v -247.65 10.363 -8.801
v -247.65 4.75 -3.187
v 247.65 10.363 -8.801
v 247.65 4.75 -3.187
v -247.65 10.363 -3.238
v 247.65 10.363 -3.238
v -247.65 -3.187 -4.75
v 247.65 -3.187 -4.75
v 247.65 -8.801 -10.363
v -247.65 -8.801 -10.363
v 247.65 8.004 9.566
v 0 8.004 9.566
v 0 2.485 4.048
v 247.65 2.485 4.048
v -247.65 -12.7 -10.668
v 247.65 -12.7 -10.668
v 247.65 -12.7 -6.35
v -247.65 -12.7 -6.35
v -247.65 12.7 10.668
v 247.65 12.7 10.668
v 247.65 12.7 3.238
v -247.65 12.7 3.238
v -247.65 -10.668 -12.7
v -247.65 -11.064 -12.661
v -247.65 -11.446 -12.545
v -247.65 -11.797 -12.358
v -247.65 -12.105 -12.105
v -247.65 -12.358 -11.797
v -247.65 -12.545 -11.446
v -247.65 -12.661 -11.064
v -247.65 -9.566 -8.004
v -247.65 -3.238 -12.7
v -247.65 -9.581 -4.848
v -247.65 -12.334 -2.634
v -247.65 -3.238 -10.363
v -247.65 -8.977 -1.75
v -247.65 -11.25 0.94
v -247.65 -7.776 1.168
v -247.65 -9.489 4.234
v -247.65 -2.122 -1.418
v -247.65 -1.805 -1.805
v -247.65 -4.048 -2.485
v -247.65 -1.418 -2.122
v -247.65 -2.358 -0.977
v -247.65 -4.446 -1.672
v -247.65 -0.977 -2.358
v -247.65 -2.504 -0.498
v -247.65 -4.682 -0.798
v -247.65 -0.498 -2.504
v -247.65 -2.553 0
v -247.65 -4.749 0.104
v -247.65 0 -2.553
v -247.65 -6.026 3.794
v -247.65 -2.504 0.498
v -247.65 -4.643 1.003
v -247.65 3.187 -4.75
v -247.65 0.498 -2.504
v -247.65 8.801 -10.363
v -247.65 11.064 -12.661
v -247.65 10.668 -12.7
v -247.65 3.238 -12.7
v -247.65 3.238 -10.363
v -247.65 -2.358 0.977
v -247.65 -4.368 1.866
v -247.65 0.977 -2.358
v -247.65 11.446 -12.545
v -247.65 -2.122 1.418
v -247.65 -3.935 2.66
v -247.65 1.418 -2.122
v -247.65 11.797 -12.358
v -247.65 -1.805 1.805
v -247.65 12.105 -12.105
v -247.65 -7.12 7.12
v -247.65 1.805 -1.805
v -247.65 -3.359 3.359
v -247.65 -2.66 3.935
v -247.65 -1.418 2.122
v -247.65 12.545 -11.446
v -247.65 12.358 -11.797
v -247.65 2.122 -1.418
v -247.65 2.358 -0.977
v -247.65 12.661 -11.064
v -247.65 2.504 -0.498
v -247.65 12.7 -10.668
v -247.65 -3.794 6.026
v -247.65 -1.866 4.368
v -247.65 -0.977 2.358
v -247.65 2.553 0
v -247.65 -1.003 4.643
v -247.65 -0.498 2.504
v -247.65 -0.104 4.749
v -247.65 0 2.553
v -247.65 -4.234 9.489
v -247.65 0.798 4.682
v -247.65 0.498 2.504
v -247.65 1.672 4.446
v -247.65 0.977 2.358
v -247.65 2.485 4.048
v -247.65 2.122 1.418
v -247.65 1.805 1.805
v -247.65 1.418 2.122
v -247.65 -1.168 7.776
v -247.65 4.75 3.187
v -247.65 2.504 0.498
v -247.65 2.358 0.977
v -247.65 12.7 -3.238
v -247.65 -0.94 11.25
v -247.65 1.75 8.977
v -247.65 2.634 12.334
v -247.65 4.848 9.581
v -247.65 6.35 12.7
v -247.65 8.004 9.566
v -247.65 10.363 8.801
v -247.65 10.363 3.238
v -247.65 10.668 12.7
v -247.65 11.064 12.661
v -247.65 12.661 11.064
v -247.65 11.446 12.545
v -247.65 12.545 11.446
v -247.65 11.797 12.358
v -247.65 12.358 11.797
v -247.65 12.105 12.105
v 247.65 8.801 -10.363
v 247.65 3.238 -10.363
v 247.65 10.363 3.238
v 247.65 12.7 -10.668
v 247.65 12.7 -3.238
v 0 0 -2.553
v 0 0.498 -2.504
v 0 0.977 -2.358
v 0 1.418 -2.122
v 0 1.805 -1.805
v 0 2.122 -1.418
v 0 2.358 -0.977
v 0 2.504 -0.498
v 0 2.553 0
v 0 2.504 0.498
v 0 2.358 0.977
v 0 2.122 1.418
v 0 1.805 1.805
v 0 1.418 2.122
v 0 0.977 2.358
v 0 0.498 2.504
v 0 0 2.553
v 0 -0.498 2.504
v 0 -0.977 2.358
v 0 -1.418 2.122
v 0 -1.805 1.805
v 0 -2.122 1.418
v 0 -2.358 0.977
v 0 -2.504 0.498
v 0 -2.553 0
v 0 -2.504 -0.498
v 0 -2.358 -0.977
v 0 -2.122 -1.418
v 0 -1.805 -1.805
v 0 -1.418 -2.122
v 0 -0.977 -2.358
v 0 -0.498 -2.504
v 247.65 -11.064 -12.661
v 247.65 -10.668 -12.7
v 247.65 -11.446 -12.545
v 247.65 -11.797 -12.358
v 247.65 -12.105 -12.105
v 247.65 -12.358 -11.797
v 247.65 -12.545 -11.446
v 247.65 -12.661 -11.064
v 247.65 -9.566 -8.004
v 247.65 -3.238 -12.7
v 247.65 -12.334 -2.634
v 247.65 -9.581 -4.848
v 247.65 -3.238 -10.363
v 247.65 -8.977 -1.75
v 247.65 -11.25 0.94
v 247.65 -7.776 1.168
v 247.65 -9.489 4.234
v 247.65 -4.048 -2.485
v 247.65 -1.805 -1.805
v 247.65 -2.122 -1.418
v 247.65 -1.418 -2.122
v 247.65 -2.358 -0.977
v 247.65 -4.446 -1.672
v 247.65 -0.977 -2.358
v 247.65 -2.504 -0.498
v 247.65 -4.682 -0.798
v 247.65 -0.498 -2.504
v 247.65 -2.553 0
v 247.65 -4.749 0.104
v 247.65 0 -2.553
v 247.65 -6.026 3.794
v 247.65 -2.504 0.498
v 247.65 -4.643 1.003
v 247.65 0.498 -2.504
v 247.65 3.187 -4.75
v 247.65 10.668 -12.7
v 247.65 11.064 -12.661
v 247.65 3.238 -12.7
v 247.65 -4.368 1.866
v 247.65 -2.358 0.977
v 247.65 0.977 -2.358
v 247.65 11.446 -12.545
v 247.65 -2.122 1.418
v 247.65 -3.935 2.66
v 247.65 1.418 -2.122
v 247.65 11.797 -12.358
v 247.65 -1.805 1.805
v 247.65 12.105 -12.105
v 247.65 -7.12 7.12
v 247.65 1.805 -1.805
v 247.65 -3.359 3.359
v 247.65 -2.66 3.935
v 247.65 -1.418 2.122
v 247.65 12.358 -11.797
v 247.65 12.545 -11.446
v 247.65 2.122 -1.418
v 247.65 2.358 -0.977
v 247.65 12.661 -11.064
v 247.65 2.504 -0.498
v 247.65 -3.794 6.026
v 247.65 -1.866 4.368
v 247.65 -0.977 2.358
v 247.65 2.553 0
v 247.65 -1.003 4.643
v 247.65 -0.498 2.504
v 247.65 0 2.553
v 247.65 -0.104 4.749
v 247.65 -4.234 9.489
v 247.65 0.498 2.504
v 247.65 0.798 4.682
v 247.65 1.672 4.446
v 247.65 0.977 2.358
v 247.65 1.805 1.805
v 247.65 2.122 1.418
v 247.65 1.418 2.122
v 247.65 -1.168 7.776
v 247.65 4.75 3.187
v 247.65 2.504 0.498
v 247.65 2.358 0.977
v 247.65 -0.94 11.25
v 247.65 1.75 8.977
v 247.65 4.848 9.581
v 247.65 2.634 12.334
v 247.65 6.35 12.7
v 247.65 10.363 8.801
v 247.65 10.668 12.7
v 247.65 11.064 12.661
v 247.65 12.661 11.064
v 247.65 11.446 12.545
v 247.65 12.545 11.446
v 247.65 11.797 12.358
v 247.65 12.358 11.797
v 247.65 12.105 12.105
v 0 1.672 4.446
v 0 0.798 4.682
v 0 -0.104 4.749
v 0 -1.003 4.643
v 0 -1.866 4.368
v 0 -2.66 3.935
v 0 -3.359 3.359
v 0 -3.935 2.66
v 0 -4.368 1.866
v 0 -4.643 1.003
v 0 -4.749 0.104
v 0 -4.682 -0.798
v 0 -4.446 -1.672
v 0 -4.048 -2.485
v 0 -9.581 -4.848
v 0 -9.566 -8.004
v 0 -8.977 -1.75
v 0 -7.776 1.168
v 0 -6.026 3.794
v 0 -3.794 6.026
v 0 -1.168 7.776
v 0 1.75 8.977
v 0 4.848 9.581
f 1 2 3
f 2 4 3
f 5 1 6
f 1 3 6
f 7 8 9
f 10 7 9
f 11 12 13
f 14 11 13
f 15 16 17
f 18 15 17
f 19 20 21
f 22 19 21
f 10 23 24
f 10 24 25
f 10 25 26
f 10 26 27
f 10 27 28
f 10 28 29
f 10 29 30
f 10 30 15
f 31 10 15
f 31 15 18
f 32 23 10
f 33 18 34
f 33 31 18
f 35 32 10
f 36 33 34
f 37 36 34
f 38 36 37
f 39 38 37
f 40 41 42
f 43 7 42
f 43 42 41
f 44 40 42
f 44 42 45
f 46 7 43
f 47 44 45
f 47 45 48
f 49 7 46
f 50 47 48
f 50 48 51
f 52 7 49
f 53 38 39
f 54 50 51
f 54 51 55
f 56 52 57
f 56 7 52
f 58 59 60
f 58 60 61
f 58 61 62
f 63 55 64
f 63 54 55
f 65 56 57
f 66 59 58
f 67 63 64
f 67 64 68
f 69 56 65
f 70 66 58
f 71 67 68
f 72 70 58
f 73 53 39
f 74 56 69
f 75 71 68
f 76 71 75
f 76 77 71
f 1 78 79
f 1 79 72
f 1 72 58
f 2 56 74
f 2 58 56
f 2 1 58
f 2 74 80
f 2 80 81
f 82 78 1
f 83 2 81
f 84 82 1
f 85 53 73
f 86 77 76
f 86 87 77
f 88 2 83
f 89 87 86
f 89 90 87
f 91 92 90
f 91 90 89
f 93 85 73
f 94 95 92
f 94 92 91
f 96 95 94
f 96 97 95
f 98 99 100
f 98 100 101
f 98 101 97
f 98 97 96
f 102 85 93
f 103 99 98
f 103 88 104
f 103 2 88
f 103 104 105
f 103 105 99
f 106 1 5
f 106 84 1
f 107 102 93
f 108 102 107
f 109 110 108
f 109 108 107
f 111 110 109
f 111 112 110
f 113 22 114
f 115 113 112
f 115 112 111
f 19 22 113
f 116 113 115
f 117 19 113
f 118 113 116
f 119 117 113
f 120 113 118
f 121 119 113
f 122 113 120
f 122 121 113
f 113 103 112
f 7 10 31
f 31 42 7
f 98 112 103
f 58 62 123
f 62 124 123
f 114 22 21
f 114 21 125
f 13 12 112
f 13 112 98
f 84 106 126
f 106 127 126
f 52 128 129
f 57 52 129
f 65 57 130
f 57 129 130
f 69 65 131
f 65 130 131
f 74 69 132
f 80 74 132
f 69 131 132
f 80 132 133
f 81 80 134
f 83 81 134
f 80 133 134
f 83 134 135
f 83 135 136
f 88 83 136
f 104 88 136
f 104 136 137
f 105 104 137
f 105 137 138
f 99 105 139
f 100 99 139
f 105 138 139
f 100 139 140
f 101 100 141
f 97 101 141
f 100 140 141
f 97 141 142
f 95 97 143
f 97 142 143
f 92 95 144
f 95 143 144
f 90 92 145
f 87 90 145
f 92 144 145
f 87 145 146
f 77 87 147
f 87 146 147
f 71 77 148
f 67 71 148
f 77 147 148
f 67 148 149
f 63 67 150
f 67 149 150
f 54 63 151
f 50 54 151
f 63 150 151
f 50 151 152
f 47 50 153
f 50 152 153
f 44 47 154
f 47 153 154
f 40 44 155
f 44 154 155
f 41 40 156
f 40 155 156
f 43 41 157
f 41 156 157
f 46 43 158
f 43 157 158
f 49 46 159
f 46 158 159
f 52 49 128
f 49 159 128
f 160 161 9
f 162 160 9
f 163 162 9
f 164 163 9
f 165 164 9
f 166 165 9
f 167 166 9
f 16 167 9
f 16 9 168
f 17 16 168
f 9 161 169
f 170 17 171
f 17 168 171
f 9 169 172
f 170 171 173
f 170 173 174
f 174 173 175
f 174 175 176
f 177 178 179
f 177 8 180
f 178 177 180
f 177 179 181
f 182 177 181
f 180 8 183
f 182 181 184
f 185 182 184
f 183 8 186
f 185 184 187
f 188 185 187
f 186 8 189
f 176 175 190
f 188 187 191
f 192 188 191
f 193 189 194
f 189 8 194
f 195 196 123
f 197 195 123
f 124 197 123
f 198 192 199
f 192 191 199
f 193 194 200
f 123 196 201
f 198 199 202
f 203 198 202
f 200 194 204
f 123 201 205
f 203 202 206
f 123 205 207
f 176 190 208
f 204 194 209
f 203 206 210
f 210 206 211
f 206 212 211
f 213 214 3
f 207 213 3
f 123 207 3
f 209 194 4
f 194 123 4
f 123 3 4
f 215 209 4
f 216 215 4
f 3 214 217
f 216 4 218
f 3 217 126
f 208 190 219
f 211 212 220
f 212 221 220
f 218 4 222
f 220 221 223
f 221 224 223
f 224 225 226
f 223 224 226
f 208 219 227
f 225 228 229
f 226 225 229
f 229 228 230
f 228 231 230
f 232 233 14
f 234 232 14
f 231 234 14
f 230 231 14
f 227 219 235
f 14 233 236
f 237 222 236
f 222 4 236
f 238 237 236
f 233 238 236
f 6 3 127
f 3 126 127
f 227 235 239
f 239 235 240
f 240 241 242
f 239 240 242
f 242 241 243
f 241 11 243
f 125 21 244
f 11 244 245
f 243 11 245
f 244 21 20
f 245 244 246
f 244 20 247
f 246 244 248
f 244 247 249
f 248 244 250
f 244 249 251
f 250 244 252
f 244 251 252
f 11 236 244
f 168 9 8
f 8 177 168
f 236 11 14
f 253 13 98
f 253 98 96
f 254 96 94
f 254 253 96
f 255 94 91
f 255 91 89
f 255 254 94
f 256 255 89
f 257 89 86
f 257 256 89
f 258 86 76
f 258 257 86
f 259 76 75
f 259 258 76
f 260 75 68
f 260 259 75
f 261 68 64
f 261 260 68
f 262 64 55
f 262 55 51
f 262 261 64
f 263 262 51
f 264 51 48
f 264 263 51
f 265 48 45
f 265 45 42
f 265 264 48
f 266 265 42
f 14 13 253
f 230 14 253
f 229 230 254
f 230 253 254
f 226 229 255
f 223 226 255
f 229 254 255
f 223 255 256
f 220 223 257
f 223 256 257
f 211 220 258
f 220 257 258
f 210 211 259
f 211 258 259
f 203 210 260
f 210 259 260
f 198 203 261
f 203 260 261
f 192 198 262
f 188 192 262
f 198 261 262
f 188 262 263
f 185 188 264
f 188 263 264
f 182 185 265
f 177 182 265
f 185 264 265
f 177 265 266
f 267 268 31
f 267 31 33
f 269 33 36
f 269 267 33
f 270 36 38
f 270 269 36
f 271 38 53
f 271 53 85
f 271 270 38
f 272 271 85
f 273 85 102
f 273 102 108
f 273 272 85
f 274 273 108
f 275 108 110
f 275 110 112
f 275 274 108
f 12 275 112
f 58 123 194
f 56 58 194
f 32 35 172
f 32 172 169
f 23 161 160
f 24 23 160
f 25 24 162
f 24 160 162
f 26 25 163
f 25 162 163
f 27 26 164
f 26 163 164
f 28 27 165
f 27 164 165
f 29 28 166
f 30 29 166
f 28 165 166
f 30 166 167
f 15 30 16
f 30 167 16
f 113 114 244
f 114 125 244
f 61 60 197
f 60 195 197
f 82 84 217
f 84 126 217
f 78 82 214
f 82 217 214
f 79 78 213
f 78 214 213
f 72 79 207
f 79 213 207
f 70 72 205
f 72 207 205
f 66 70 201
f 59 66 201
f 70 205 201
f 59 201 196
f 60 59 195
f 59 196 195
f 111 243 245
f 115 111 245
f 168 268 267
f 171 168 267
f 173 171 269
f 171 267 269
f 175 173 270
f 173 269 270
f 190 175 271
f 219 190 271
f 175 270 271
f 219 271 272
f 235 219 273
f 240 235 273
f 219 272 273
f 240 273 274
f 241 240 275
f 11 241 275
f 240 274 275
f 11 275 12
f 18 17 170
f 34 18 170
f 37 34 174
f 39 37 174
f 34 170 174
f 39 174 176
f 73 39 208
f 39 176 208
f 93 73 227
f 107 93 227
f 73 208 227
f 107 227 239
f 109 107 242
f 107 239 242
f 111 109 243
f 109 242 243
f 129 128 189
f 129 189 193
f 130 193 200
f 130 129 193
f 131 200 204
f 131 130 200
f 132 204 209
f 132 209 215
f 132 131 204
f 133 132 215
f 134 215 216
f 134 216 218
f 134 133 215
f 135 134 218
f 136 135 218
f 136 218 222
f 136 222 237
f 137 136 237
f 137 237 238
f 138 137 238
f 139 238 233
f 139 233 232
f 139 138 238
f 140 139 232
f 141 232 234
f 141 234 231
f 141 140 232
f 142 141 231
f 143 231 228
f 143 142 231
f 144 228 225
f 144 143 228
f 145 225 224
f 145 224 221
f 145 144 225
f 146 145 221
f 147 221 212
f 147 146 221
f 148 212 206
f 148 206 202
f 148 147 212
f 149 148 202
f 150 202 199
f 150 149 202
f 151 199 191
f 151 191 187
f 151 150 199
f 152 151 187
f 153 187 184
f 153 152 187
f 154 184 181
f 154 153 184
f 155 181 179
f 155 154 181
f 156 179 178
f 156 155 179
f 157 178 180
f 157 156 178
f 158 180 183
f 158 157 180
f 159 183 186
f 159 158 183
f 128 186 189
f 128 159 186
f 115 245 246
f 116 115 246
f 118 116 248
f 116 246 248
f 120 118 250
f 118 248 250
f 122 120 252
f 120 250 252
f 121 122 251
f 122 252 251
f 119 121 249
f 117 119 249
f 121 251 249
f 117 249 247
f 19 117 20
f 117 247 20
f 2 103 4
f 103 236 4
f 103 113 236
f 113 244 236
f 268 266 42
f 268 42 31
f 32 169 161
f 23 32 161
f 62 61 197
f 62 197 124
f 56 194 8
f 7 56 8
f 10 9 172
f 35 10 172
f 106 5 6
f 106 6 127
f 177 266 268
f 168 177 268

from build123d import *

# Parameters (mm, degrees)
SKETCH3_R                = 2.5527
BOSS_EXTRUDE1_DEPTH      = 247.65
BOSS_EXTRUDE1_DEPTH_BACK = 247.65


with BuildPart() as part:
    # Sketch3 → Boss-Extrude1 (new body, two sides)
    with BuildSketch(Plane(origin=(0, 0, 0), x_dir=(0, 0, -1), z_dir=(1, 0, 0))) as boss_extrude1_sk:
        with BuildLine():
            Line((-10.668, 12.7), (-3.2385, 12.7))
            Line((-3.2385, 12.7), (-3.2385, 10.3632))
            Line((-3.2385, 10.3632), (-8.800635435, 10.3632))
            Line((-8.800635435, 10.3632), (-3.187235669, 4.749800235))
            Line((-3.187235669, 4.749800235), (3.187235669, 4.749800235))
            Line((3.187235669, 4.749800235), (8.800635435, 10.3632))
            Line((8.800635435, 10.3632), (3.2385, 10.3632))
            Line((3.2385, 10.3632), (3.2385, 12.7))
            Line((3.2385, 12.7), (10.668, 12.7))
            ThreePointArc((10.668, 12.7), (12.104840979, 12.104840979), (12.7, 10.668))
            Line((12.7, 10.668), (12.7, 3.2385))
            Line((12.7, 3.2385), (10.3632, 3.2385))
            Line((10.3632, 3.2385), (10.3632, 8.800635435))
            Line((10.3632, 8.800635435), (4.749800235, 3.187235669))
            Line((4.749800235, 3.187235669), (4.749800235, -3.187235669))
            Line((4.749800235, -3.187235669), (10.3632, -8.800635435))
            Line((10.3632, -8.800635435), (10.3632, -3.2385))
            Line((10.3632, -3.2385), (12.7, -3.2385))
            Line((12.7, -3.2385), (12.7, -10.668))
            ThreePointArc((12.7, -10.668), (12.104840979, -12.104840979), (10.668, -12.7))
            Line((10.668, -12.7), (6.35, -12.7))
            ThreePointArc((6.35, -12.7), (-7.120384182, -7.120384182), (-12.7, 6.35))
            Line((-12.7, 6.35), (-12.7, 10.668))
            ThreePointArc((-12.7, 10.668), (-12.104840979, 12.104840979), (-10.668, 12.7))
        make_face()
        Circle(SKETCH3_R, mode=Mode.SUBTRACT)
        with BuildLine():
            Line((2.485198871, -4.047763436), (8.003751298, -9.566315863))
            ThreePointArc((8.003751298, -9.566315863), (-4.965122713, -4.965122713), (-9.566315863, 8.003751298))
            Line((-9.566315863, 8.003751298), (-4.047763436, 2.485198871))
            ThreePointArc((-4.047763436, 2.485198871), (-3.358615955, -3.358615955), (2.485198871, -4.047763436))
        make_face(mode=Mode.SUBTRACT)
    extrude(amount=BOSS_EXTRUDE1_DEPTH)
    extrude(boss_extrude1_sk.sketch, amount=-BOSS_EXTRUDE1_DEPTH_BACK)


solid = part.part
